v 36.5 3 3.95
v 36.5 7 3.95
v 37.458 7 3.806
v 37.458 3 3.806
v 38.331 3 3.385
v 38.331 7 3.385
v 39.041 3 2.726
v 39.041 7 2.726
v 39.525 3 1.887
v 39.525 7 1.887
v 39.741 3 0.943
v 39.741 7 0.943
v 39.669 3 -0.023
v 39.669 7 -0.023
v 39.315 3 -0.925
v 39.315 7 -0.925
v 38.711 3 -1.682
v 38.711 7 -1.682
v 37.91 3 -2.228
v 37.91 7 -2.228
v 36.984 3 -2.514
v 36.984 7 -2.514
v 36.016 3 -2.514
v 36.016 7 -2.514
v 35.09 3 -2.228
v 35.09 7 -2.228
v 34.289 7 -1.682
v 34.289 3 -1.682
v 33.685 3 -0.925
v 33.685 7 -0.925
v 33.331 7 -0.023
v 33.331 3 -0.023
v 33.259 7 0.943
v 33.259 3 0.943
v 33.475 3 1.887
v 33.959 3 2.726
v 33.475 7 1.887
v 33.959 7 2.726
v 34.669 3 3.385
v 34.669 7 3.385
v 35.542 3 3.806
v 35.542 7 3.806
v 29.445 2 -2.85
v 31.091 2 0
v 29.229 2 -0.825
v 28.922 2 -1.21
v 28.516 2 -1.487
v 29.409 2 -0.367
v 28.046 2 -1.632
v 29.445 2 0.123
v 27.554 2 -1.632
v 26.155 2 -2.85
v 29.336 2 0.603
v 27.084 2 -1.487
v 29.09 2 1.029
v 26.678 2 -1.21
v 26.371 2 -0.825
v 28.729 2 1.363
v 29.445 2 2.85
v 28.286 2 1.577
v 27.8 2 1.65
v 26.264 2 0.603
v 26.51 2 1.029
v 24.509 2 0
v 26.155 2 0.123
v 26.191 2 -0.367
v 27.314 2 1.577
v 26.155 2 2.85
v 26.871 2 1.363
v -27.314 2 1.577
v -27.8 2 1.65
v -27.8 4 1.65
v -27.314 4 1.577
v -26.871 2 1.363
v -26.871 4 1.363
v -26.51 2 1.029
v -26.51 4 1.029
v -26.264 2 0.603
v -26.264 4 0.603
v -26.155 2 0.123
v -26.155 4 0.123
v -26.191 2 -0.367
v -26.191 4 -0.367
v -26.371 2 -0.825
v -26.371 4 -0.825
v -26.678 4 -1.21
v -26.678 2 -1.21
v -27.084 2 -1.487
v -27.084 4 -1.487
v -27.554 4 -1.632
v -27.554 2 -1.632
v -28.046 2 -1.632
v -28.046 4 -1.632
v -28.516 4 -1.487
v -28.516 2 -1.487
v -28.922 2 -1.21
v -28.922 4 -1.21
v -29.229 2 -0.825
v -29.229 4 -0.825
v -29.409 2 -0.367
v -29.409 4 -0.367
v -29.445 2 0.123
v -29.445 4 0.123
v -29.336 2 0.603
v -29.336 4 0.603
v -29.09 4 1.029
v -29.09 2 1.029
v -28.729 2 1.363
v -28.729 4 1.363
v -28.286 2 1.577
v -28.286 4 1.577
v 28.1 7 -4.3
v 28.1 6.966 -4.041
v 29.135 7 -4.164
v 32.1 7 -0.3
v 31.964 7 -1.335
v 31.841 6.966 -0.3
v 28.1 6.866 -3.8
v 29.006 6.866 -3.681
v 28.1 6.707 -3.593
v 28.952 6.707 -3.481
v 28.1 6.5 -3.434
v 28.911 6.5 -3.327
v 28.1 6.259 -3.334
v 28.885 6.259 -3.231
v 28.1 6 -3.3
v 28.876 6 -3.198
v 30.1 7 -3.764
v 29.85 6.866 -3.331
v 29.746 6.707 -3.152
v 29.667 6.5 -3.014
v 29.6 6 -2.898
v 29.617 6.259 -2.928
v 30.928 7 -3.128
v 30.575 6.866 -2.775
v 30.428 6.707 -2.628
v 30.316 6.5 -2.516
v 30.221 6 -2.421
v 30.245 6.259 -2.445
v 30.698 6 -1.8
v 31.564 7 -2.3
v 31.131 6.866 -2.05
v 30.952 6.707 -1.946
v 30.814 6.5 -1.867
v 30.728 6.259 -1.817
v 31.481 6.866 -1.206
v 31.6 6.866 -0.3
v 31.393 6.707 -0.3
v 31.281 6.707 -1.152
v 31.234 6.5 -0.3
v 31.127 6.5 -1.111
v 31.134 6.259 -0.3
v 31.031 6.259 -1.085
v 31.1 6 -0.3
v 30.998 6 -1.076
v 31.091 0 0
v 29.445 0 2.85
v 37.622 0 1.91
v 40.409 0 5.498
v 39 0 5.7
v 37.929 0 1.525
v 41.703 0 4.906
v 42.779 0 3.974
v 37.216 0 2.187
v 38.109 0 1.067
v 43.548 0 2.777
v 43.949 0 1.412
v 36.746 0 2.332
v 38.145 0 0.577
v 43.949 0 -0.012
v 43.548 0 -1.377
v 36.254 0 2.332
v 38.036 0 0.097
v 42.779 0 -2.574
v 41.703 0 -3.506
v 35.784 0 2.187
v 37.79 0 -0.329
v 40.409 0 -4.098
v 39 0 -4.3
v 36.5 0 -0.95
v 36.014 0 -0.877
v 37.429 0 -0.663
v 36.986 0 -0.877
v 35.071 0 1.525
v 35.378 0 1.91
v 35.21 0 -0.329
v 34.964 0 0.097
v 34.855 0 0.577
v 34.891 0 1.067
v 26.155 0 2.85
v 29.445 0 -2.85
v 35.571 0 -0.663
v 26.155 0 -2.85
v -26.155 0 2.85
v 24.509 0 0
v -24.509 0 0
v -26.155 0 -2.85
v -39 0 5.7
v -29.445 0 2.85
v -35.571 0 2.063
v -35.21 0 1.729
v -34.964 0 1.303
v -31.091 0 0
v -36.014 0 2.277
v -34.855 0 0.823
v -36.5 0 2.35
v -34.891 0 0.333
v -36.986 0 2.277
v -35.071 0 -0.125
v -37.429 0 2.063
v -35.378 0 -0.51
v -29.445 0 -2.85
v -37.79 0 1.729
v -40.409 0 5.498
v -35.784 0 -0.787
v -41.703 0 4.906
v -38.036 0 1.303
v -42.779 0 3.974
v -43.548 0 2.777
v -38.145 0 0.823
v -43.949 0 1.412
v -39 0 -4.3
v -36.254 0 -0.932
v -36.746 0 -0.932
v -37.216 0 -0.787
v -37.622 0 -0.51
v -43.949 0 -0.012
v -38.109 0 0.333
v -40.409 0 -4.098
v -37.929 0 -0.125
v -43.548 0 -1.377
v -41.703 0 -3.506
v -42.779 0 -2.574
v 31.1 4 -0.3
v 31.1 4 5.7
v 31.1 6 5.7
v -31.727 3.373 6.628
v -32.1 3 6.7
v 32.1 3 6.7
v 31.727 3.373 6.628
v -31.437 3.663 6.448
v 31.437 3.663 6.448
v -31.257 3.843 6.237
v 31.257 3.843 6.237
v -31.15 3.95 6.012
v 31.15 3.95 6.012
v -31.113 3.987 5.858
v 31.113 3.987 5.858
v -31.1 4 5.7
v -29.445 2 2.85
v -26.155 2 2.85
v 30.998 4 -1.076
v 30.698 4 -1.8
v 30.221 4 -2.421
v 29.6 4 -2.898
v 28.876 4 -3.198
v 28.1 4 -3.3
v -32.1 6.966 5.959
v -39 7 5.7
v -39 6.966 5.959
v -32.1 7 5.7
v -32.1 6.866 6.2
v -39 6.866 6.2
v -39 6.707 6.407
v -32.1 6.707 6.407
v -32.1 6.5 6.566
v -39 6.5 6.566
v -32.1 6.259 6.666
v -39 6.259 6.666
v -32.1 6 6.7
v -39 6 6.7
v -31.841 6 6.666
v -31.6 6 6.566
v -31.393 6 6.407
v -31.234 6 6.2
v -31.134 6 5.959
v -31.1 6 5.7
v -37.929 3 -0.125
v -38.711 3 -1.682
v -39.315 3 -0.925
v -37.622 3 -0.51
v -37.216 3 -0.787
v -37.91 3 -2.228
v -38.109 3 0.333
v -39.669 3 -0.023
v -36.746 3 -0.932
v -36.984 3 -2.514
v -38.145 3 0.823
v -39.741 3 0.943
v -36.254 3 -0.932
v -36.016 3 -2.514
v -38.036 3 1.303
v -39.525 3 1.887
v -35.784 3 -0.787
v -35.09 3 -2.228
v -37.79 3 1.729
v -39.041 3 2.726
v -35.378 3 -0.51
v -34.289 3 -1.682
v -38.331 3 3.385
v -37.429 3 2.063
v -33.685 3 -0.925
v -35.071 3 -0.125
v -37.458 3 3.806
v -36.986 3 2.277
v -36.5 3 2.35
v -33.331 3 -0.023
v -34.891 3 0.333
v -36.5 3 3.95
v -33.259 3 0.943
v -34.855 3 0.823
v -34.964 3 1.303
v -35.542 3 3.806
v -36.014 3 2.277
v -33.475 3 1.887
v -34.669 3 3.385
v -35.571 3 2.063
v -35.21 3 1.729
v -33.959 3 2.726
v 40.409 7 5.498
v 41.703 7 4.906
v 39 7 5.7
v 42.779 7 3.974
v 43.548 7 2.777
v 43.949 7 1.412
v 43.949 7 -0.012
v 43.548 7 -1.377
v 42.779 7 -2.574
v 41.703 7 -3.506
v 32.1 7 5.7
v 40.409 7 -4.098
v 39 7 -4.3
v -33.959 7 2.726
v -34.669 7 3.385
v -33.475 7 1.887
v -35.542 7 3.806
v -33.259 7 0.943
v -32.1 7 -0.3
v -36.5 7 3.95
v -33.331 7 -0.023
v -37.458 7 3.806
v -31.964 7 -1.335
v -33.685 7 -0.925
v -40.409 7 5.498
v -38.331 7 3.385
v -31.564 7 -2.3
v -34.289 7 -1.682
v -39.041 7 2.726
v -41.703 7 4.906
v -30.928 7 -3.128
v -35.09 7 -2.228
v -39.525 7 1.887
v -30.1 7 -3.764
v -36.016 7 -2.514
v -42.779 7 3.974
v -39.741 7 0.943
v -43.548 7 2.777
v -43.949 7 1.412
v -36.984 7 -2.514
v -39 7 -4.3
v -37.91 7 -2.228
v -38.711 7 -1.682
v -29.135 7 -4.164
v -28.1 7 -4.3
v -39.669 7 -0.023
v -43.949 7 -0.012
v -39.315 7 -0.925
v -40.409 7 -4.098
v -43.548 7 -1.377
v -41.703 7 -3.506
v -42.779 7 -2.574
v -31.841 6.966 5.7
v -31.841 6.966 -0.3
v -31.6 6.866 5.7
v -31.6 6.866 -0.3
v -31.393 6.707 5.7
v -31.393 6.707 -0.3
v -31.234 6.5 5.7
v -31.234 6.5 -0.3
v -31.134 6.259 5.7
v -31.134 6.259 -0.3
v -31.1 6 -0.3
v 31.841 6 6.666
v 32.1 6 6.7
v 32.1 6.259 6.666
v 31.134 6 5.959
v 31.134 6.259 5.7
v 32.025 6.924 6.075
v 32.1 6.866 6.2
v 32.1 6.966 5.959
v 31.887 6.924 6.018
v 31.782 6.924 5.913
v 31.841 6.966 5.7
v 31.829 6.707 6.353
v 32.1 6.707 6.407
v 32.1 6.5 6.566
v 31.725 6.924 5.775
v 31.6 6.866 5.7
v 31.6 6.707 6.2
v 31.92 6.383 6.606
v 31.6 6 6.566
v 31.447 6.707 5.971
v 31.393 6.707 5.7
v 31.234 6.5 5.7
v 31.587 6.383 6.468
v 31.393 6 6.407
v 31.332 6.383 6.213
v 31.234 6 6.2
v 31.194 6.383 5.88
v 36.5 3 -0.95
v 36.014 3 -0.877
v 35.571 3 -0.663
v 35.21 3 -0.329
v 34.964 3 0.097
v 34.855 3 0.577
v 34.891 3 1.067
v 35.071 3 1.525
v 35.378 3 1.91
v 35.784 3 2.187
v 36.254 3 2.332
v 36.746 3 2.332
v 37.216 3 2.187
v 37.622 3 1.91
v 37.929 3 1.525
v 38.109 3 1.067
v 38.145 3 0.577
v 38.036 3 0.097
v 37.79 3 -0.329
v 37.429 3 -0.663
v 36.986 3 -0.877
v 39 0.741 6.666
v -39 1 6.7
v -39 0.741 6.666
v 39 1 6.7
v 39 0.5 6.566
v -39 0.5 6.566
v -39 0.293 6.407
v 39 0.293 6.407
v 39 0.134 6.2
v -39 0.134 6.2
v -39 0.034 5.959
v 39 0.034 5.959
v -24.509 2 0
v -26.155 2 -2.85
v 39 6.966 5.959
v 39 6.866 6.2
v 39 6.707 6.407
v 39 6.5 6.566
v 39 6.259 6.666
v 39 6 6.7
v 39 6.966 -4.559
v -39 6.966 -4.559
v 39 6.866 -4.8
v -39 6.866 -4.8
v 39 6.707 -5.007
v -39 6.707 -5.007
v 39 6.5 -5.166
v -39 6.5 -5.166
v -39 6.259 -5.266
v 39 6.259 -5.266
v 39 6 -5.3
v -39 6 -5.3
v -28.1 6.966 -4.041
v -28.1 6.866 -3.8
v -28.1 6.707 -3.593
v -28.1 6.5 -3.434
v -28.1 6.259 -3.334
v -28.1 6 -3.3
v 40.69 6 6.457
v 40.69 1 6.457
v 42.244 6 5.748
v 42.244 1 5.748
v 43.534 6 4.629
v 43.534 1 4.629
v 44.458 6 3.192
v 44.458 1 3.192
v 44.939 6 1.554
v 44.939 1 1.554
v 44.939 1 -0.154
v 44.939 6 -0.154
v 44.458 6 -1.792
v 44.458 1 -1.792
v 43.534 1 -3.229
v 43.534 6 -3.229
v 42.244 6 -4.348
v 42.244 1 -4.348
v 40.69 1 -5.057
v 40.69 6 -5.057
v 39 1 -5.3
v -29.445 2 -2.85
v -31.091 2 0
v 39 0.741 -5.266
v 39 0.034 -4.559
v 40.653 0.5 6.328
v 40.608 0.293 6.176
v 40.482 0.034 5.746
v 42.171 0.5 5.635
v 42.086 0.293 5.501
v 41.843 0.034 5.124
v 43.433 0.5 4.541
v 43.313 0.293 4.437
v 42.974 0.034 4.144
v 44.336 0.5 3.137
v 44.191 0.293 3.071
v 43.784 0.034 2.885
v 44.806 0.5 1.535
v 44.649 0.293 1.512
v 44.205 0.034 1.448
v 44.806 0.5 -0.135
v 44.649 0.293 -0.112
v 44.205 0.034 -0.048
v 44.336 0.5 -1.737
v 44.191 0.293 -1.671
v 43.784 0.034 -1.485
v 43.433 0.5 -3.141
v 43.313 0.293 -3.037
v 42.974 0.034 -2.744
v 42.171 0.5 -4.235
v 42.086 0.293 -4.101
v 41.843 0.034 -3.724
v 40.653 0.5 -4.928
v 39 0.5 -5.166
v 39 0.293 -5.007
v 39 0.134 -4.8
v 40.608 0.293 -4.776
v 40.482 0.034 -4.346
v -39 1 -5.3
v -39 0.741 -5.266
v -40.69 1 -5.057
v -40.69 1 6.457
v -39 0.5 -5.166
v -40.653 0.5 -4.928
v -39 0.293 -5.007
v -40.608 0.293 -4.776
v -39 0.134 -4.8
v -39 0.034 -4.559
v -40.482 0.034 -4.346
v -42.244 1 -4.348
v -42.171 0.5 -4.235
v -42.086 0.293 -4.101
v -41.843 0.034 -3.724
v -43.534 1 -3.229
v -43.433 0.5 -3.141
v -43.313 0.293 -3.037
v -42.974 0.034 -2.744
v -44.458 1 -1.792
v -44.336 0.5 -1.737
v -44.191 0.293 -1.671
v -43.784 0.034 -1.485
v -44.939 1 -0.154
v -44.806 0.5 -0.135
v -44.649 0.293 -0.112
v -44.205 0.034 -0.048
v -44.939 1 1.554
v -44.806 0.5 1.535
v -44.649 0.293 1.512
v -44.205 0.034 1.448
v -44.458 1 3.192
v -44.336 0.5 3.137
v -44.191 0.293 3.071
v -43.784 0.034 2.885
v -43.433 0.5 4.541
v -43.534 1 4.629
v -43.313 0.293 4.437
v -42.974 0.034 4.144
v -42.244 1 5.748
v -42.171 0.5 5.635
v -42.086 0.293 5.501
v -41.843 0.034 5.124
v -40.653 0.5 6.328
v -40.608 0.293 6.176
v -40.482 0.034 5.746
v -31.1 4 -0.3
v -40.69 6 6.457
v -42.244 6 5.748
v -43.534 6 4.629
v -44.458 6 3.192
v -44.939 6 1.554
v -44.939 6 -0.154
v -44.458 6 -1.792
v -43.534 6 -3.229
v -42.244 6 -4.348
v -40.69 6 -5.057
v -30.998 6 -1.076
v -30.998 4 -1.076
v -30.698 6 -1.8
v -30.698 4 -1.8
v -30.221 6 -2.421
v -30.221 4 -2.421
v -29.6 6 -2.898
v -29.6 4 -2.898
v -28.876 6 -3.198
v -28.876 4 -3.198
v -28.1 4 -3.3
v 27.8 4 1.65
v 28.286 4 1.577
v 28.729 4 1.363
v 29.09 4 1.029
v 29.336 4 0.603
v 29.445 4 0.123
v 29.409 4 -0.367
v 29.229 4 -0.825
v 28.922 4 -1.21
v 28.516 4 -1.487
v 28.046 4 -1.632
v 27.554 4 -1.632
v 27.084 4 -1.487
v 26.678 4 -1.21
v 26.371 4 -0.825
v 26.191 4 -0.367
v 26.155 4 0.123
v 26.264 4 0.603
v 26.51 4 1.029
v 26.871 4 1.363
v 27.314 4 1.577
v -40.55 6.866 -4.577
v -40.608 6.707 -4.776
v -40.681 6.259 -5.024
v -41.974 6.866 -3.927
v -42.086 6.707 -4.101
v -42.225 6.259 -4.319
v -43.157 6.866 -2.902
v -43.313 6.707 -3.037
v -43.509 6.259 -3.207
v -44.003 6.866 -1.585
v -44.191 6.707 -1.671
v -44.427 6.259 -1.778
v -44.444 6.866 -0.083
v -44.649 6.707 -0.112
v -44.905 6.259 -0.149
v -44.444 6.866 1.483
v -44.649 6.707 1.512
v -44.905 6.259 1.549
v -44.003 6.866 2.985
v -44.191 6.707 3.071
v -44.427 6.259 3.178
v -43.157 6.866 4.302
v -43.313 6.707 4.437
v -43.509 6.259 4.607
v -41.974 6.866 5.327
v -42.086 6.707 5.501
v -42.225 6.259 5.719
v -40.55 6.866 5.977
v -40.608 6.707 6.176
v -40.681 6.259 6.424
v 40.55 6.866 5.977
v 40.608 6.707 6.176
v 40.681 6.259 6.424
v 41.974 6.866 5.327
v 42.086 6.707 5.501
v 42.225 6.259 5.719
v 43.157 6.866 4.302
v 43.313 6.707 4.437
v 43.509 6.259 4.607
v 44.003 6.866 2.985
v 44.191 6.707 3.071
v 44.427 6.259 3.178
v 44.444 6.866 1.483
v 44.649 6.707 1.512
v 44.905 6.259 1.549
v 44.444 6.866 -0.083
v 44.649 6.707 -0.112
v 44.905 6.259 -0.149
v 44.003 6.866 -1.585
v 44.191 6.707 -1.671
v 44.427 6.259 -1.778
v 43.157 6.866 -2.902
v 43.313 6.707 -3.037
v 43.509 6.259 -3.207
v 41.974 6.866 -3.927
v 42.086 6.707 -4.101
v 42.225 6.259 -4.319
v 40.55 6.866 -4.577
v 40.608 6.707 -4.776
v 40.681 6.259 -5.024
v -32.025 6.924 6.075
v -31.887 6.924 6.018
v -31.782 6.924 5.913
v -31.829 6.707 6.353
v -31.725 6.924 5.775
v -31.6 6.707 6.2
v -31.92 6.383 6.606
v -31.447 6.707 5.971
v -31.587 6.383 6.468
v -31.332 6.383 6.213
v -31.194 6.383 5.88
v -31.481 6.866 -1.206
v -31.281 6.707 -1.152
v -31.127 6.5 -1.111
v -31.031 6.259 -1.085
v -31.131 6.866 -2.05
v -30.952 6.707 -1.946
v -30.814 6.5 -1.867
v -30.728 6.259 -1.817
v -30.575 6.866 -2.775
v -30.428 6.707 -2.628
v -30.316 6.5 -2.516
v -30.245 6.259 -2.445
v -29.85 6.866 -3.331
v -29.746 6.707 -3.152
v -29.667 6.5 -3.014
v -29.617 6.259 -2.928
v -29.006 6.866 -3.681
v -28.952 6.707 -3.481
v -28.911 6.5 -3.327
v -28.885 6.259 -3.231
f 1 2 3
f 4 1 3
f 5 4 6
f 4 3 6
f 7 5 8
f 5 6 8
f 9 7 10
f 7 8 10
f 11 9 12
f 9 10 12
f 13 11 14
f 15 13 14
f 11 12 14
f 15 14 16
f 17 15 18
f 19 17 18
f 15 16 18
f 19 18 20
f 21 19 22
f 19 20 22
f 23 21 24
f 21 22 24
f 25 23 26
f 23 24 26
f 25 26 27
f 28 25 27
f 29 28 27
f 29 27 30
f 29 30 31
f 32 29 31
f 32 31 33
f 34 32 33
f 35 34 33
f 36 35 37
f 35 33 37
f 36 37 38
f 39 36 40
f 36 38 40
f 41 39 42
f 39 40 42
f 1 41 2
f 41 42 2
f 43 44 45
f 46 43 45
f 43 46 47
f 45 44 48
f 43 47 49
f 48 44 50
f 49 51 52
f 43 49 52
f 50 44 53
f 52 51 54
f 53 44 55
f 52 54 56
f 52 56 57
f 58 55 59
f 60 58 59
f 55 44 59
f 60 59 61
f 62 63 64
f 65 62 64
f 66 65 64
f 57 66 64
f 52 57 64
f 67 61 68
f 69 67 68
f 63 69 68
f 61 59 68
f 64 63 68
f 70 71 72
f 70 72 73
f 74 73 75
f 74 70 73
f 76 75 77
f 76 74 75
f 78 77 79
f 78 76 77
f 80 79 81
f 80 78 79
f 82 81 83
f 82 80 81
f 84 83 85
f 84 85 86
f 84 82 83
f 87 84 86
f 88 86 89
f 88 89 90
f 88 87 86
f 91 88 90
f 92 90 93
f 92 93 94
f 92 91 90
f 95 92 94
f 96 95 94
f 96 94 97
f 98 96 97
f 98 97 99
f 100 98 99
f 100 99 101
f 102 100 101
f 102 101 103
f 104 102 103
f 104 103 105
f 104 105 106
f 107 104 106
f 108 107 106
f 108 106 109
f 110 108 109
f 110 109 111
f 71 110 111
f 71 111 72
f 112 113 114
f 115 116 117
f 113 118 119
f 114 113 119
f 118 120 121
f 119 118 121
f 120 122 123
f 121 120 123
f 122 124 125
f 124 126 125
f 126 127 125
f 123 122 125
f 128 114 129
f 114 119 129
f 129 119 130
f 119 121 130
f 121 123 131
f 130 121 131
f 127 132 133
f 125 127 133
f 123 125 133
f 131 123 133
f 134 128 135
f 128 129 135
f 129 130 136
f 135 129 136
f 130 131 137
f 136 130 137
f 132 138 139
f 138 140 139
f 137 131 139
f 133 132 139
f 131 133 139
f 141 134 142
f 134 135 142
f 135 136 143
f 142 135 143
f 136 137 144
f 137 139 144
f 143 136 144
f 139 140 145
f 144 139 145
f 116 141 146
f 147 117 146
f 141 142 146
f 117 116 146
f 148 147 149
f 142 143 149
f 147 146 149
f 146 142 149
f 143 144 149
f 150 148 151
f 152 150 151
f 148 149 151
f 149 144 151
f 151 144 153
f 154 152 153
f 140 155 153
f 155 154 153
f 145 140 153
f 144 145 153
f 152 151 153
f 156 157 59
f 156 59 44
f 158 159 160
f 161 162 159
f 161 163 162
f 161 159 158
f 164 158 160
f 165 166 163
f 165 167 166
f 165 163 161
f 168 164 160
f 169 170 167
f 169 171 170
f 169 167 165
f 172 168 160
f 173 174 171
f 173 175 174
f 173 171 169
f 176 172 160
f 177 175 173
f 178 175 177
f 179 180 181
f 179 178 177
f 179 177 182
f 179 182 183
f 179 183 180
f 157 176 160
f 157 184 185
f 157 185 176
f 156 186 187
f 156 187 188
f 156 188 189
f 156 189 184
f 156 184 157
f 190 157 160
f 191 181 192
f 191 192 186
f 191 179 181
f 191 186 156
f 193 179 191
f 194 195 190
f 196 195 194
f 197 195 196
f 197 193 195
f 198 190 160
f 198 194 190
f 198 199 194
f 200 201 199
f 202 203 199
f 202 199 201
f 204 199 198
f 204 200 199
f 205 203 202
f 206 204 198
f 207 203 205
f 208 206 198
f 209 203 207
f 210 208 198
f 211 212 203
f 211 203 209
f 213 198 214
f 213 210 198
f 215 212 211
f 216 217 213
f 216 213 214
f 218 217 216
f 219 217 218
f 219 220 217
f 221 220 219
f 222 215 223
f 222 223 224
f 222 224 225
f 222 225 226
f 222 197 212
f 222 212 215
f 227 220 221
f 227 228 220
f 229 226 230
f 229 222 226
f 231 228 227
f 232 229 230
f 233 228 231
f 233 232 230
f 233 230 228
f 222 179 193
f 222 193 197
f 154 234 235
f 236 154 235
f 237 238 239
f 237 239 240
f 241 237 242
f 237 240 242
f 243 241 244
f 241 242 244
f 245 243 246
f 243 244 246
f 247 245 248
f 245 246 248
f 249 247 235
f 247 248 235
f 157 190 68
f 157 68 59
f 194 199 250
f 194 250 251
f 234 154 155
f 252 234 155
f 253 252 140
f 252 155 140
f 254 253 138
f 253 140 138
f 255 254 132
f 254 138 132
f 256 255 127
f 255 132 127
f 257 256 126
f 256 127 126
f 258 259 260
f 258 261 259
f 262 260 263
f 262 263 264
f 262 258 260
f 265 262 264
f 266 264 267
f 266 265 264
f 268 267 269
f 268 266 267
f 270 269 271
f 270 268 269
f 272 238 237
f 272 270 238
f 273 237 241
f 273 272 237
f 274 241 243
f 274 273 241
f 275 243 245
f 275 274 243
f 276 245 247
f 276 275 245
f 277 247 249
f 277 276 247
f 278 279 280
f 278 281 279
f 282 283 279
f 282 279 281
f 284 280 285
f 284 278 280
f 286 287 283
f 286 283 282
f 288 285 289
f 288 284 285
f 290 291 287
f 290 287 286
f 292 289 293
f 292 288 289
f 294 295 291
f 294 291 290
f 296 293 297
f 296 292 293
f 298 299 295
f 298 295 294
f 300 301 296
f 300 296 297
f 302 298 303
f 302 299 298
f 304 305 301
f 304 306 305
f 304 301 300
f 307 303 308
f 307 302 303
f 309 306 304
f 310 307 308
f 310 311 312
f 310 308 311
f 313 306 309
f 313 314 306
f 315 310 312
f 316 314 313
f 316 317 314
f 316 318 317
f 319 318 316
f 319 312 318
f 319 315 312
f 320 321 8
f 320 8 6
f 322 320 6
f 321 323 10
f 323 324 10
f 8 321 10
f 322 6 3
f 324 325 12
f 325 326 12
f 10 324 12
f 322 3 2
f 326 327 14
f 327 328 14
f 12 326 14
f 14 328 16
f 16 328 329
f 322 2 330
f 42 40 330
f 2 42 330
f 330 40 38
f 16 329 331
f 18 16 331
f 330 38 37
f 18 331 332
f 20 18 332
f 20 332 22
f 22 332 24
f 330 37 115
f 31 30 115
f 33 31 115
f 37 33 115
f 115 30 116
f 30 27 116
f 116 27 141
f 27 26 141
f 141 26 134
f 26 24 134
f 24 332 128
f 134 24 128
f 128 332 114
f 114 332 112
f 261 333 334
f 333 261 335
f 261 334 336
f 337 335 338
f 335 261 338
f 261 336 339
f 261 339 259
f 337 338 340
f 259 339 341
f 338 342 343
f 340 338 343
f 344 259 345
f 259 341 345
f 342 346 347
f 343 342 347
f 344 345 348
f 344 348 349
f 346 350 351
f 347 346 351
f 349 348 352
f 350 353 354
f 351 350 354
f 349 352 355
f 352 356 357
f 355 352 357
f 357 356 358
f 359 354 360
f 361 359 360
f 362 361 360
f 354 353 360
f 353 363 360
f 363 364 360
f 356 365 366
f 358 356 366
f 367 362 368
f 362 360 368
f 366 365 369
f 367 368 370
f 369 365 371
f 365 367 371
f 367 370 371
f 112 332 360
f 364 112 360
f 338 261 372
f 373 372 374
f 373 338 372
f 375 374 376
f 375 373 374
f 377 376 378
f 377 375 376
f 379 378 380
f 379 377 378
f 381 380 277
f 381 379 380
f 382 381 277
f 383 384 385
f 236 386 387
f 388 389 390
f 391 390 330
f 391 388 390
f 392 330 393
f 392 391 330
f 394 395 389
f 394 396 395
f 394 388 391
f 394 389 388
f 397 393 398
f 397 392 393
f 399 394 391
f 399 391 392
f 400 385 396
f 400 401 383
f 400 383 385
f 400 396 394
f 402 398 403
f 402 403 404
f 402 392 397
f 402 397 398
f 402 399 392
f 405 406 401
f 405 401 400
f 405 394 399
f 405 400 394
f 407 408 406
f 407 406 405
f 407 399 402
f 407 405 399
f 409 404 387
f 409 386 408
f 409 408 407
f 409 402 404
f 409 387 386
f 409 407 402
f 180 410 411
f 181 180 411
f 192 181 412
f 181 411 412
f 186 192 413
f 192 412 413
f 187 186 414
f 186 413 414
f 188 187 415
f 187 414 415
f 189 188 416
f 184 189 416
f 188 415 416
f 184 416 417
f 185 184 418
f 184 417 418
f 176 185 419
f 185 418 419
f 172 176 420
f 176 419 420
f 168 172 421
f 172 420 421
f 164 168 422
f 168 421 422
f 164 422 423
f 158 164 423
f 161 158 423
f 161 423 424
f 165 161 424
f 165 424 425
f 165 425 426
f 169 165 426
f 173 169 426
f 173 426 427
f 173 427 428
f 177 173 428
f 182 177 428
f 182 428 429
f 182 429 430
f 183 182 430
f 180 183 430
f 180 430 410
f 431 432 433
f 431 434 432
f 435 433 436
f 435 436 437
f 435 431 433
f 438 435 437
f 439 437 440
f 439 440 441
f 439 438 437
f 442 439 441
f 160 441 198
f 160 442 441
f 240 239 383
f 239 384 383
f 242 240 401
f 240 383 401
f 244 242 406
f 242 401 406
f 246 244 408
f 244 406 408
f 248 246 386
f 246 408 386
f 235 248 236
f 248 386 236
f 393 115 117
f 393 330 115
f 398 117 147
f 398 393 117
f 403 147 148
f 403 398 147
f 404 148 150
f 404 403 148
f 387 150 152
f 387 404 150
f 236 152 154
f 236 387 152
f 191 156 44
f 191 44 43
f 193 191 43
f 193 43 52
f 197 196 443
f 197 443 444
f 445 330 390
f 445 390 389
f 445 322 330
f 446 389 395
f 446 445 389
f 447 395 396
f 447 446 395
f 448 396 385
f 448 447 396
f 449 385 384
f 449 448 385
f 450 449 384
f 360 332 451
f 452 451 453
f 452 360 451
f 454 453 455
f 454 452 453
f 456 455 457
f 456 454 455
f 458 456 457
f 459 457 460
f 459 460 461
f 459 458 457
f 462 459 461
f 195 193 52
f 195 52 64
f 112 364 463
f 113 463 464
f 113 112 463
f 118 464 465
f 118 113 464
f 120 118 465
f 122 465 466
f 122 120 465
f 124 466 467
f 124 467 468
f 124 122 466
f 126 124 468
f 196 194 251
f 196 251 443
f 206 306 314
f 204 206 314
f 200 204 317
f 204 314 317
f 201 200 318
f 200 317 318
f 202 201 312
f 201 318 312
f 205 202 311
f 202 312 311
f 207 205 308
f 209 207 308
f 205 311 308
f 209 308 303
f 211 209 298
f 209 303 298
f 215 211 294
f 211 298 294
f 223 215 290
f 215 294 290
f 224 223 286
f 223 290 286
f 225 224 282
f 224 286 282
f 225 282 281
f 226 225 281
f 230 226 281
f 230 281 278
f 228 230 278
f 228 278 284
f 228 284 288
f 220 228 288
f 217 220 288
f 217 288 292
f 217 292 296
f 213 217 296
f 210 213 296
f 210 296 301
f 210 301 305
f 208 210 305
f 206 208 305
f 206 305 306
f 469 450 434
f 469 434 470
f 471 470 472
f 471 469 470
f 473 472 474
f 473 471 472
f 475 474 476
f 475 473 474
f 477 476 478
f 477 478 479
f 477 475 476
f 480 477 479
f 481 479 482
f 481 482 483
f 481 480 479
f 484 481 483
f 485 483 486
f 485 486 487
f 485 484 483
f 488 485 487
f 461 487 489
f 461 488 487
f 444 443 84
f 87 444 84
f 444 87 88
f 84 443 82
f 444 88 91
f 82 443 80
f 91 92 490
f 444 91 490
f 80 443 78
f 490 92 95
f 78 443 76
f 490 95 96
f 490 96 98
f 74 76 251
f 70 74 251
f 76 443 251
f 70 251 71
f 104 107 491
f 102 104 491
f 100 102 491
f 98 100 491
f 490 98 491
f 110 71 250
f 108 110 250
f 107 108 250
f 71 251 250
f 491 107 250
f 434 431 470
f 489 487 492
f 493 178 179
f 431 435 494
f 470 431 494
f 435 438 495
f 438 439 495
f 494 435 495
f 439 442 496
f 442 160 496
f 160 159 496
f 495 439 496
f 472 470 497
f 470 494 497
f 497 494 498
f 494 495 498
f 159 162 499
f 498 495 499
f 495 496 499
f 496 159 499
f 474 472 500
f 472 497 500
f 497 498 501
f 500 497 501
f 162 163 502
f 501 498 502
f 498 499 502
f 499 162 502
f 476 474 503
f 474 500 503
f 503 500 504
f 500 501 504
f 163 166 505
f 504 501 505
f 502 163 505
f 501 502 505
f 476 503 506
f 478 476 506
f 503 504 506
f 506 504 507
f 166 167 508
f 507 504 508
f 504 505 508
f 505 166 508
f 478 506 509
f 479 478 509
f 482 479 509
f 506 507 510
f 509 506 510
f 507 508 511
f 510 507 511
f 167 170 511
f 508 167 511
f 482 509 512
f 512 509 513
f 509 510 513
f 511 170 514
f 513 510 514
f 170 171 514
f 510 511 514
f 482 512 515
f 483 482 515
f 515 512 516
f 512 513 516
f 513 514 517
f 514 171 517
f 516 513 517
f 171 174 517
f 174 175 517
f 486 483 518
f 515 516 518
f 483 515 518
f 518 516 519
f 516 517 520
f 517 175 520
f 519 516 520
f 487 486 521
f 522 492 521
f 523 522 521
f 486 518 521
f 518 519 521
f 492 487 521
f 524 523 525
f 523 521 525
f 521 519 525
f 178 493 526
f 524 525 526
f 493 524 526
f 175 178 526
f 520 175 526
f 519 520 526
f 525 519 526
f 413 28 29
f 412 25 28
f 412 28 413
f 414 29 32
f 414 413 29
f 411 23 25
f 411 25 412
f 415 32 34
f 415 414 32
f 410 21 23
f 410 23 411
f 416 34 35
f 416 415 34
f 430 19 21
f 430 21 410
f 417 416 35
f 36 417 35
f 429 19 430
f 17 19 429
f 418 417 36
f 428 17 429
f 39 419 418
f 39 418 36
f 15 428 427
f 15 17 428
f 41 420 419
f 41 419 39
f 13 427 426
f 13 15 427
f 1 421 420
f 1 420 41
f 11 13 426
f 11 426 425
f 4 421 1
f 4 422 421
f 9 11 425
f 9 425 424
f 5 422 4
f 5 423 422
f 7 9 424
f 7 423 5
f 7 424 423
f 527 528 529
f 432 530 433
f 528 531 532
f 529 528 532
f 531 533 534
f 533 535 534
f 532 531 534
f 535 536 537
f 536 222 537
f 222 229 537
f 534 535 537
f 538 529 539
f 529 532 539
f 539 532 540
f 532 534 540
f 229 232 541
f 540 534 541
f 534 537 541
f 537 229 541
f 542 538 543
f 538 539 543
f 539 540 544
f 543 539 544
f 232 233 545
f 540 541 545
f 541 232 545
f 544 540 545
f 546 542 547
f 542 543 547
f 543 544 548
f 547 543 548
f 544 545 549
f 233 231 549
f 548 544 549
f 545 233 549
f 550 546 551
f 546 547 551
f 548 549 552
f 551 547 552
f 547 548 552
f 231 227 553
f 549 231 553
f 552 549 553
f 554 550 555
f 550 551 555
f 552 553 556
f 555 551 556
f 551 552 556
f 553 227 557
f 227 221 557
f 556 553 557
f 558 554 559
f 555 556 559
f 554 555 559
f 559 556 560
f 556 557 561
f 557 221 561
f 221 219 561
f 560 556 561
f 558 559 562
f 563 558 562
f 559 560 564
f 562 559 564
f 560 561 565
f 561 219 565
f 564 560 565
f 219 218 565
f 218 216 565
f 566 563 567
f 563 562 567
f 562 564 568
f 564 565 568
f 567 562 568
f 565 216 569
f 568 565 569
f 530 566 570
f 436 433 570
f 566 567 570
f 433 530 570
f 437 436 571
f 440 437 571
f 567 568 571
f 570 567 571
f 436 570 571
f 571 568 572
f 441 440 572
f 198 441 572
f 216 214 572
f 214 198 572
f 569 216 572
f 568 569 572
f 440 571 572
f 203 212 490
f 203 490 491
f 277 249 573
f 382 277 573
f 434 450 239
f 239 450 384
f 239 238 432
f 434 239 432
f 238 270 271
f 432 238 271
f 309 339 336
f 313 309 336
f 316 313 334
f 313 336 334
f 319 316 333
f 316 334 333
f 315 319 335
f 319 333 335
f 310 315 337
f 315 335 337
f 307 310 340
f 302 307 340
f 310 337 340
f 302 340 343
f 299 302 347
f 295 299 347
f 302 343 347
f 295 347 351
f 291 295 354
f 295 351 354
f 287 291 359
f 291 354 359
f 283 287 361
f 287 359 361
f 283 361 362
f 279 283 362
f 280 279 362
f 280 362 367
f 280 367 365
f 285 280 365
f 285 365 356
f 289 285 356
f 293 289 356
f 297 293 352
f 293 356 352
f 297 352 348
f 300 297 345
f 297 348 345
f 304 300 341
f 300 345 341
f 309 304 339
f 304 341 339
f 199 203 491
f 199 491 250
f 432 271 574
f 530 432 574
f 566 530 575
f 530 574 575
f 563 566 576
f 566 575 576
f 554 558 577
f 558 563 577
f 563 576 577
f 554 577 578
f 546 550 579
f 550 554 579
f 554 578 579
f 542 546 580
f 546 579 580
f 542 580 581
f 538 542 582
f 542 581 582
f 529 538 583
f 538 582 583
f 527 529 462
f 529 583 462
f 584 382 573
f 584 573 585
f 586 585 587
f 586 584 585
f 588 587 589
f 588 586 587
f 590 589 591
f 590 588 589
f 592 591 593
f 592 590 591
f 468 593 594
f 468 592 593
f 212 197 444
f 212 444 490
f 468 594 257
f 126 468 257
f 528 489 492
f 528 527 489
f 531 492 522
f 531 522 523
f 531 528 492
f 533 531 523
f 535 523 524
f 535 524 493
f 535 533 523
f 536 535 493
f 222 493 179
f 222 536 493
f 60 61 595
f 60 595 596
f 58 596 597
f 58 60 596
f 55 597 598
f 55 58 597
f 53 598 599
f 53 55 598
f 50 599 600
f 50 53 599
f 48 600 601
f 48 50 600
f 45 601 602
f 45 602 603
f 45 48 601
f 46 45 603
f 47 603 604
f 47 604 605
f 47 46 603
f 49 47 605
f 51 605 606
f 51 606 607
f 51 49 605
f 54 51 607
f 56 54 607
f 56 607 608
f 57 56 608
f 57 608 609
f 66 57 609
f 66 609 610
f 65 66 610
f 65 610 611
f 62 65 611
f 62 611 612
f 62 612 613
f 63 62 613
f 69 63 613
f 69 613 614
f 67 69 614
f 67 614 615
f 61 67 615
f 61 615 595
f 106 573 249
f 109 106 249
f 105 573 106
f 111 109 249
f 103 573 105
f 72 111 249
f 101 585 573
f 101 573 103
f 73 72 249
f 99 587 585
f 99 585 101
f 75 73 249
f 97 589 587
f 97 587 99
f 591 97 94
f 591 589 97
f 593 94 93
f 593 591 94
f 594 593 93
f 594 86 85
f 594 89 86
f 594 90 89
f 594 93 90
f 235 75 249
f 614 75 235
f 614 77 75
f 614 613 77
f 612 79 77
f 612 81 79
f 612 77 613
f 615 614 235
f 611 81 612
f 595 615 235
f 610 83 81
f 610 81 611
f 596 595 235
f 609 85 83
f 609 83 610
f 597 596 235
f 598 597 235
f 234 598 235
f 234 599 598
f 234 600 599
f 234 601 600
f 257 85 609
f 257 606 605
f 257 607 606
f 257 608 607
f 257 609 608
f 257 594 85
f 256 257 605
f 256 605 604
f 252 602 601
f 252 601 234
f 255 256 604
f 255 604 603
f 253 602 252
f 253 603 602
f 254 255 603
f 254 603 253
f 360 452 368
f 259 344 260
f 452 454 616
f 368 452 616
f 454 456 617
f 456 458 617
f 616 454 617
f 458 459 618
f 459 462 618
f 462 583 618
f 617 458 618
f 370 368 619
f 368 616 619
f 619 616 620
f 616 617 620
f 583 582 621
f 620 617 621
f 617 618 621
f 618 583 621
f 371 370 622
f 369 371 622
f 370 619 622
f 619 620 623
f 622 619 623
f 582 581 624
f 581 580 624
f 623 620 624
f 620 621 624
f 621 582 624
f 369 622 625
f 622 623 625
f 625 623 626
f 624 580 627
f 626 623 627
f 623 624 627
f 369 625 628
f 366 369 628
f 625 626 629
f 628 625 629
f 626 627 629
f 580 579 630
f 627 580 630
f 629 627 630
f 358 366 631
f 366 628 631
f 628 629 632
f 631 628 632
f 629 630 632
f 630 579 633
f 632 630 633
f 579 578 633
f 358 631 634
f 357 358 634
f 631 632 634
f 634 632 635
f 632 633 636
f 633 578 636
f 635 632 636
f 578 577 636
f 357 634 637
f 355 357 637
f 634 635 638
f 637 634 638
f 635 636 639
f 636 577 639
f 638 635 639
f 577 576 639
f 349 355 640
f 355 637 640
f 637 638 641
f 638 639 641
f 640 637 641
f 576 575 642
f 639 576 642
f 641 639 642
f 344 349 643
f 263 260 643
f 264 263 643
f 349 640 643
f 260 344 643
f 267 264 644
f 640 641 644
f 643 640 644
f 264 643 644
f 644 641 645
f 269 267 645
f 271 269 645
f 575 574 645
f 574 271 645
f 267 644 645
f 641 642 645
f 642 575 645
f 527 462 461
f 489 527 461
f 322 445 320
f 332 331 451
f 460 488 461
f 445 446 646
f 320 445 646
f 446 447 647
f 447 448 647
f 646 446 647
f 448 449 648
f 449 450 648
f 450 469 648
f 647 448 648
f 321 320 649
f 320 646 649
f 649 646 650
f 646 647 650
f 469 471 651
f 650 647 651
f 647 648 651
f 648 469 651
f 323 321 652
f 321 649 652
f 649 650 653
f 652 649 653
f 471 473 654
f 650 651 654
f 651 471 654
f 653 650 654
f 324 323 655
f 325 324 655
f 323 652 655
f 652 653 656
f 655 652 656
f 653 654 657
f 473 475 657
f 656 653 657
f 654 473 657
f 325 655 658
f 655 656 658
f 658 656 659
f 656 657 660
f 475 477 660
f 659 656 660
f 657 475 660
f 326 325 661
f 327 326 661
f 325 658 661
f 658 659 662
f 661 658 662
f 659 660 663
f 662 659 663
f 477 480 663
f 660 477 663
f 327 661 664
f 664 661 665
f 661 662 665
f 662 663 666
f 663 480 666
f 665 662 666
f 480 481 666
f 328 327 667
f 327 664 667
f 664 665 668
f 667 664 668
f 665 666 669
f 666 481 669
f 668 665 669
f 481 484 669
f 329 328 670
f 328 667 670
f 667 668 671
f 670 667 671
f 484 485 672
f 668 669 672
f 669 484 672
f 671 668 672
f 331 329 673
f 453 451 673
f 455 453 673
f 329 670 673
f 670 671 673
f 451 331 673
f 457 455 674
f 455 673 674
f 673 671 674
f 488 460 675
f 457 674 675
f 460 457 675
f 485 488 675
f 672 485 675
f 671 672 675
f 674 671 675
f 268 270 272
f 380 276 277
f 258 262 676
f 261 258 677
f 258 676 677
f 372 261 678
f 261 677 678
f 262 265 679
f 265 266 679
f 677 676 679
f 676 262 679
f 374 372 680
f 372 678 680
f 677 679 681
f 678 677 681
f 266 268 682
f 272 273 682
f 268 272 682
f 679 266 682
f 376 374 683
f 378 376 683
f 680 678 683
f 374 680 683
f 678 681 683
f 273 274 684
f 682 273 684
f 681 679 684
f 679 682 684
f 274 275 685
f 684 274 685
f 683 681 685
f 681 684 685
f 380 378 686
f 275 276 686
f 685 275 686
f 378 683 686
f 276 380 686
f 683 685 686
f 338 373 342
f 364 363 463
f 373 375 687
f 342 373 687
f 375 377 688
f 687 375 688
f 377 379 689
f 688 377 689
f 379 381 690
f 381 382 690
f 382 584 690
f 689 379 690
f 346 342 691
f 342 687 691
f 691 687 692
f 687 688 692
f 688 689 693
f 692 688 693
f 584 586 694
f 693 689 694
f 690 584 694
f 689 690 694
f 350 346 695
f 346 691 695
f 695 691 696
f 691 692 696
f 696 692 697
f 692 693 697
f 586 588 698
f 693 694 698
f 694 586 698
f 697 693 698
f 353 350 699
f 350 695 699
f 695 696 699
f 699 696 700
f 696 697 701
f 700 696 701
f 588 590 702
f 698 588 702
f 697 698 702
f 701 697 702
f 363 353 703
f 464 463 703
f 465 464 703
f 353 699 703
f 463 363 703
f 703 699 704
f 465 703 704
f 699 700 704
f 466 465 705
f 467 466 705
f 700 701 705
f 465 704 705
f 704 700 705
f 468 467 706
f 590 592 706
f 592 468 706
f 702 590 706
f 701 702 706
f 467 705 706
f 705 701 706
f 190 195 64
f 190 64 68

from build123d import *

# Parameters (mm, degrees)
ESQUISSE1_W             = 62.2
ESQUISSE1_H             = 10
ESQUISSE1_R             = 1.65
BOSS_EXTRU_1_DEPTH      = 4
BOSS_EXTRU_2_DEPTH      = 3
BOSS_EXTRU_2_DEPTH_BACK = 4
CONG_1_R                = 3
ESQUISSE3_R             = 1.65
BOSS_EXTRU_3_DEPTH      = 7
ENL_V_MAT_EXTRU_1_DEPTH = 2
ESQUISSE6_R             = 3.25
ENL_V_MAT_EXTRU_2_DEPTH = 4
CONG_2_R                = 1


with BuildPart() as part:
    # Esquisse1 → Boss.-Extru.1 (new body)
    with BuildSketch(Plane(origin=(0, 0, 0), x_dir=(1, 0, 0), z_dir=(0, 1, 0))):
        with Locations((0, -1.7)):
            Rectangle(ESQUISSE1_W, ESQUISSE1_H)
        with Locations(Location((-27.8, 0, 0), (0, 0, 270))):
            Circle(ESQUISSE1_R, mode=Mode.SUBTRACT)
        with Locations(Location((27.8, 0, 0), (0, 0, 270))):
            Circle(ESQUISSE1_R, mode=Mode.SUBTRACT)
    extrude(amount=BOSS_EXTRU_1_DEPTH)

    # Esquisse2 → Boss.-Extru.2 (add, two sides: drawn at the far end of the back side and taken through both)
    with BuildSketch(Plane(origin=(0, 4, 0), x_dir=(1, 0, 0), z_dir=(0, 1, 0)).offset(-BOSS_EXTRU_2_DEPTH_BACK)):
        Polygon((-31.1, -6.7), (-31.1, 3.3), (31.1, 3.3), (31.1, -6.7), (33.5, -6.7), (33.5, 5.3), (-33.5, 5.3), (-33.5, -6.7), align=None)
    extrude(amount=BOSS_EXTRU_2_DEPTH + BOSS_EXTRU_2_DEPTH_BACK)

    # Congé1
    cong_1_edges = [part.edges().sort_by_distance(p)[0] for p in [
        (31.1, 5.5, -3.3),
        (-31.1, 5.5, -3.3),
    ]]
    fillet(cong_1_edges, radius=CONG_1_R)

    # Esquisse3 → Boss.-Extru.3 (add)
    # profile 1 of 2: a face of its own
    with BuildSketch(Plane(origin=(0, 7, 0), x_dir=(1, 0, 0), z_dir=(0, 1, 0))):
        with BuildLine():
            Line((-39, 5.3), (-33.5, 5.3))
            Line((-33.5, 5.3), (-33.5, -6.7))
            Line((-33.5, -6.7), (-39, -6.7))
            ThreePointArc((-39, -6.7), (-45, -0.7), (-39, 5.3))
        make_face()
        with Locations(Location((-36.5, -0.7, 0), (0, 0, 270))):
            Circle(ESQUISSE3_R, mode=Mode.SUBTRACT)
    # profile 2 of 2: a face of its own
    with BuildSketch(Plane(origin=(0, 7, 0), x_dir=(1, 0, 0), z_dir=(0, 1, 0))):
        with BuildLine():
            Line((33.5, 5.3), (33.5, -6.7))
            Line((33.5, -6.7), (39, -6.7))
            ThreePointArc((39, -6.7), (45, -0.7), (39, 5.3))
            Line((39, 5.3), (33.5, 5.3))
        make_face()
        with Locations(Location((36.5, -0.7, 0), (0, 0, 90))):
            Circle(ESQUISSE3_R, mode=Mode.SUBTRACT)
    extrude(amount=-BOSS_EXTRU_3_DEPTH)

    # Esquisse5 → Enlèv. mat.-Extru.1 (cut)
    with BuildSketch(Plane.XZ):
        Polygon((-29.445448267, 2.85), (-26.154551733, 2.85), (-24.509103466, 0), (-26.154551733, -2.85), (-29.445448267, -2.85), (-31.090896534, 0), align=None)
        Polygon((26.154551733, 2.85), (29.445448267, 2.85), (31.090896534, 0), (29.445448267, -2.85), (26.154551733, -2.85), (24.509103466, 0), align=None)
    extrude(amount=-ENL_V_MAT_EXTRU_1_DEPTH, mode=Mode.SUBTRACT)

    # Esquisse6 → Enlèv. mat.-Extru.2 (cut)
    with BuildSketch(Plane(origin=(0, 7, 0), x_dir=(1, 0, 0), z_dir=(0, 1, 0))):
        with Locations(Location((-36.5, -0.7, 0), (0, 0, 270))):
            Circle(ESQUISSE6_R)
        with Locations(Location((36.5, -0.7, 0), (0, 0, 270))):
            Circle(ESQUISSE6_R)
    extrude(amount=-ENL_V_MAT_EXTRU_2_DEPTH, mode=Mode.SUBTRACT)

    # Congé2
    cong_2_edges = [part.edges().sort_by_distance(p)[0] for p in [
        (0, 4, 6.7),
        (31.1, 5.5, 6.7),
        (0, 0, -5.3),
        (-31.1, 5.5, 6.7),
        (-35.05, 7, 6.7),
        (-31.1, 7, 3.2),
        (35.05, 7, 6.7),
        (0, 7, -5.3),
        (0, 7, -3.3),
        (31.1, 7, 3.2),
        (0, 0, 6.7),
        (30.221320344, 7, -2.421320344),
        (-30.221320344, 7, -2.421320344),
        (-45, 0, 0.7),
        (-45, 7, 0.7),
        (45, 0, 0.7),
        (45, 7, 0.7),
    ]]
    fillet(cong_2_edges, radius=CONG_2_R - 0.0001)  # a hair under: the kernel refuses the full size


solid = part.part
